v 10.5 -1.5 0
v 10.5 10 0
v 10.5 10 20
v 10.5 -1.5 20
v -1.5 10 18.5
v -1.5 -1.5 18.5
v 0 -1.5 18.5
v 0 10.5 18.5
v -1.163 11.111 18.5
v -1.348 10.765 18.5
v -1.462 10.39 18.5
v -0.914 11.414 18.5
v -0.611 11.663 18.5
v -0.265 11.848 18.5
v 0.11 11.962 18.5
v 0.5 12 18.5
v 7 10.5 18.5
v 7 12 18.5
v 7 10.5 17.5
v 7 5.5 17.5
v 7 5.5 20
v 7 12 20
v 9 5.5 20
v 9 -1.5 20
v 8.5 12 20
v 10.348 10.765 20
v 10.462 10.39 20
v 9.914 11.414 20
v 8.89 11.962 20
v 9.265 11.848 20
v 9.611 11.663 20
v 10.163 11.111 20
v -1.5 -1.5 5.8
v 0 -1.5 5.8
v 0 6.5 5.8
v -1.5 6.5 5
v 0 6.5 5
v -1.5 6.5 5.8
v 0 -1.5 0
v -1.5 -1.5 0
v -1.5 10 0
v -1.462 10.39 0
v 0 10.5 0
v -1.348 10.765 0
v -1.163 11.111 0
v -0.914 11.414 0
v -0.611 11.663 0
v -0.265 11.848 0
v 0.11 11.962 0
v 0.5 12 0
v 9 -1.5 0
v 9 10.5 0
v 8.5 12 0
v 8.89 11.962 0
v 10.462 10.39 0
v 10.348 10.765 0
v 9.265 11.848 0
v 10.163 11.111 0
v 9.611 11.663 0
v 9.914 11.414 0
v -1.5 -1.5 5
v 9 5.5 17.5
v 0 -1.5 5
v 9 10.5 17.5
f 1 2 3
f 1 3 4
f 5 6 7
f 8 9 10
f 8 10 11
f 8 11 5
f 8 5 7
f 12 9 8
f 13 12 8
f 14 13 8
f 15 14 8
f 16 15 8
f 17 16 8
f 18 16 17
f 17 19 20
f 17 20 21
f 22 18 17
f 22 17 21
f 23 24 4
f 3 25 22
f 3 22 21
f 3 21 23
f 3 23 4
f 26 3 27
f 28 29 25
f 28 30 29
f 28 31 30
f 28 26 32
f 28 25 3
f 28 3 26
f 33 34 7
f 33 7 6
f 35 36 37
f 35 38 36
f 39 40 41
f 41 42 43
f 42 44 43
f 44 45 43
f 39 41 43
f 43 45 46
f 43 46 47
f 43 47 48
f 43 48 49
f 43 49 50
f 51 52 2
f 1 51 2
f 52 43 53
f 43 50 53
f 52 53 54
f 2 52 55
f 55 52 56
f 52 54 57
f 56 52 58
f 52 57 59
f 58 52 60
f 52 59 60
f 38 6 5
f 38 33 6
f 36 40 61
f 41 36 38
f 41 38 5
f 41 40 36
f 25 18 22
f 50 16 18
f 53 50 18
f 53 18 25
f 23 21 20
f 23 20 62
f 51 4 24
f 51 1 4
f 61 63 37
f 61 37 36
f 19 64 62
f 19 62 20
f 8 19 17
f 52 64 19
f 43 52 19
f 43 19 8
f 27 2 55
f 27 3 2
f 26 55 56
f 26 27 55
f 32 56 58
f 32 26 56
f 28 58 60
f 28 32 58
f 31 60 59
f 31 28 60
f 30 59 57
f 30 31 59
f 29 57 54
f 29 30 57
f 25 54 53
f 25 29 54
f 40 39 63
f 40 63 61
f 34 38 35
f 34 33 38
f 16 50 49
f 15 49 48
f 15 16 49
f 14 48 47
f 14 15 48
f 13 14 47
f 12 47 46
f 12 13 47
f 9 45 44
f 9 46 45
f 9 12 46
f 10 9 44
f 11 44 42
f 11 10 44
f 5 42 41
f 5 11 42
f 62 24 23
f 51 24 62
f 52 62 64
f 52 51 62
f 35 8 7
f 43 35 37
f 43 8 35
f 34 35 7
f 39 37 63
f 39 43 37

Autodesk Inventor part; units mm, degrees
ref_plane "YZ Plane" through (0, 0, 0) normal (1, 0, 0) x (0, 1, 0)
ref_plane "XZ Plane" through (0, 0, 0) normal (0, 1, 0) x (-1, 0, 0)
ref_plane "XY Plane" through (0, 0, 0) normal (0, 0, 1) x (1, 0, 0)
sketch "스케치1" plane through (0, 0, 0) normal (0, 0, 1) x (1, 0, 0)
  line L0 (0, 0) -> (9, 0)
  line L1 (9, 0) -> (9, 10.5)
  line L2 (9, 10.5) -> (0, 10.5)
  line L3 (0, 10.5) -> (0, 0)
  line L4 (-1.5, 12) -> (10.5, 12)
  line L5 (10.5, 12) -> (10.5, -1.5)
  line L6 (10.5, -1.5) -> (-1.5, -1.5)
  line L7 (-1.5, -1.5) -> (-1.5, 12)
  line L8 (0, 0) -> (0, -1.5)
  line L9 (9, 0) -> (9, -1.5)
  line L10 (0, 0) -> (-1.5, 0)
  line L11 (9, 0) -> (10.5, 0)
  dimension "d0" = 9
  dimension "d1" = 10.5
  dimension "d2" = 1.5
extrude "돌출1" add sketch "스케치1" along normal blind 20 contours L10 L7 L4 L5 L11 L1 L2 L3 | L8 L6 L7 L10 | L11 L5 L6 L9
sketch "스케치2" plane through (-1.5, -1.5, 0) normal (0, -1, 0) x (1, 0, 0)
  line L0 (0, 0) -> (1.5, 0) projected
  line L1 (1.5, 0) -> (1.5, 20) projected
  line L2 (0, 20) -> (1.5, 20) projected
  line L3 (0, 0) -> (0, 20) projected
  line L4 (1.5, 5) -> (0, 5)
  line L5 (0, 5) -> (0, 5.8)
  line L6 (0, 5.8) -> (1.5, 5.8)
  line L7 (1.5, 5.8) -> (1.5, 5)
  point P0 (1.5, 0)
  point P1 (1.5, 5.8)
  point P2 (0, 5)
  dimension "d5" = 0.8
  dimension "d6" = 5
extrude "돌출2" cut sketch "스케치2" against normal blind 8 contours L3 L6 L1 L4
fillet "모깎기1" radius 2 2 edges at (-1.5, 12, 10) (10.5, 12, 10)
sketch "스케치5" plane through (0, 10.5, 0) normal (0, -1, 0) x (1, 0, 0)
  line L0 (0, 0) -> (9, 0) projected
  line L1 (9, 0) -> (9, 20) projected
  line L2 (0, 20) -> (9, 20) projected
  line L3 (0, 0) -> (0, 20) projected
  line L4 (9, 17.5) -> (7, 17.5)
  line L5 (7, 17.5) -> (7, 20)
  line L6 (8.5, 20) -> (0.5, 20) projected
  point P0 (0, 0)
  dimension "d21" = 2.5
  dimension "d22" = 2
extrude "돌출5" add sketch "스케치5" along normal blind 5 contours L4 L5 L2 L1
sketch "스케치7" plane through (0, 0, 20) normal (0, 0, 1) x (1, 0, 0)
  arc A0 (10.5, 10) -> (8.5, 12) centre (8.5, 10) ccw projected
  line L0 (8.5, 12) -> (0.5, 12) projected
  arc A1 (0.5, 12) -> (-1.5, 10) centre (0.5, 10) ccw projected
  line L1 (-1.5, 10) -> (-1.5, -1.5) projected
  line L2 (-1.5, -1.5) -> (0, -1.5) projected
  line L3 (0, -1.5) -> (0, 10.5) projected
  line L4 (0, 10.5) -> (7, 10.5) projected
  line L5 (7, 10.5) -> (7, 5.5) projected
  line L6 (9, 5.5) -> (7, 5.5) projected
  line L7 (9, 5.5) -> (9, -1.5) projected
  line L8 (9, -1.5) -> (10.5, -1.5) projected
  line L9 (10.5, -1.5) -> (10.5, 10) projected
  line L10 (0, 10.5) -> (9, 10.5) projected
  line L11 (7, 10.5) -> (7, 12)
  line L12 (8.5, 12) -> (0.5, 12) projected
  point P0 (0, 0)
extrude "돌출6" cut sketch "스케치7" against normal blind 1.5 contours L11 L4 L3 L2 L1 A1 L0
properties part number "_3D 인쇄"
